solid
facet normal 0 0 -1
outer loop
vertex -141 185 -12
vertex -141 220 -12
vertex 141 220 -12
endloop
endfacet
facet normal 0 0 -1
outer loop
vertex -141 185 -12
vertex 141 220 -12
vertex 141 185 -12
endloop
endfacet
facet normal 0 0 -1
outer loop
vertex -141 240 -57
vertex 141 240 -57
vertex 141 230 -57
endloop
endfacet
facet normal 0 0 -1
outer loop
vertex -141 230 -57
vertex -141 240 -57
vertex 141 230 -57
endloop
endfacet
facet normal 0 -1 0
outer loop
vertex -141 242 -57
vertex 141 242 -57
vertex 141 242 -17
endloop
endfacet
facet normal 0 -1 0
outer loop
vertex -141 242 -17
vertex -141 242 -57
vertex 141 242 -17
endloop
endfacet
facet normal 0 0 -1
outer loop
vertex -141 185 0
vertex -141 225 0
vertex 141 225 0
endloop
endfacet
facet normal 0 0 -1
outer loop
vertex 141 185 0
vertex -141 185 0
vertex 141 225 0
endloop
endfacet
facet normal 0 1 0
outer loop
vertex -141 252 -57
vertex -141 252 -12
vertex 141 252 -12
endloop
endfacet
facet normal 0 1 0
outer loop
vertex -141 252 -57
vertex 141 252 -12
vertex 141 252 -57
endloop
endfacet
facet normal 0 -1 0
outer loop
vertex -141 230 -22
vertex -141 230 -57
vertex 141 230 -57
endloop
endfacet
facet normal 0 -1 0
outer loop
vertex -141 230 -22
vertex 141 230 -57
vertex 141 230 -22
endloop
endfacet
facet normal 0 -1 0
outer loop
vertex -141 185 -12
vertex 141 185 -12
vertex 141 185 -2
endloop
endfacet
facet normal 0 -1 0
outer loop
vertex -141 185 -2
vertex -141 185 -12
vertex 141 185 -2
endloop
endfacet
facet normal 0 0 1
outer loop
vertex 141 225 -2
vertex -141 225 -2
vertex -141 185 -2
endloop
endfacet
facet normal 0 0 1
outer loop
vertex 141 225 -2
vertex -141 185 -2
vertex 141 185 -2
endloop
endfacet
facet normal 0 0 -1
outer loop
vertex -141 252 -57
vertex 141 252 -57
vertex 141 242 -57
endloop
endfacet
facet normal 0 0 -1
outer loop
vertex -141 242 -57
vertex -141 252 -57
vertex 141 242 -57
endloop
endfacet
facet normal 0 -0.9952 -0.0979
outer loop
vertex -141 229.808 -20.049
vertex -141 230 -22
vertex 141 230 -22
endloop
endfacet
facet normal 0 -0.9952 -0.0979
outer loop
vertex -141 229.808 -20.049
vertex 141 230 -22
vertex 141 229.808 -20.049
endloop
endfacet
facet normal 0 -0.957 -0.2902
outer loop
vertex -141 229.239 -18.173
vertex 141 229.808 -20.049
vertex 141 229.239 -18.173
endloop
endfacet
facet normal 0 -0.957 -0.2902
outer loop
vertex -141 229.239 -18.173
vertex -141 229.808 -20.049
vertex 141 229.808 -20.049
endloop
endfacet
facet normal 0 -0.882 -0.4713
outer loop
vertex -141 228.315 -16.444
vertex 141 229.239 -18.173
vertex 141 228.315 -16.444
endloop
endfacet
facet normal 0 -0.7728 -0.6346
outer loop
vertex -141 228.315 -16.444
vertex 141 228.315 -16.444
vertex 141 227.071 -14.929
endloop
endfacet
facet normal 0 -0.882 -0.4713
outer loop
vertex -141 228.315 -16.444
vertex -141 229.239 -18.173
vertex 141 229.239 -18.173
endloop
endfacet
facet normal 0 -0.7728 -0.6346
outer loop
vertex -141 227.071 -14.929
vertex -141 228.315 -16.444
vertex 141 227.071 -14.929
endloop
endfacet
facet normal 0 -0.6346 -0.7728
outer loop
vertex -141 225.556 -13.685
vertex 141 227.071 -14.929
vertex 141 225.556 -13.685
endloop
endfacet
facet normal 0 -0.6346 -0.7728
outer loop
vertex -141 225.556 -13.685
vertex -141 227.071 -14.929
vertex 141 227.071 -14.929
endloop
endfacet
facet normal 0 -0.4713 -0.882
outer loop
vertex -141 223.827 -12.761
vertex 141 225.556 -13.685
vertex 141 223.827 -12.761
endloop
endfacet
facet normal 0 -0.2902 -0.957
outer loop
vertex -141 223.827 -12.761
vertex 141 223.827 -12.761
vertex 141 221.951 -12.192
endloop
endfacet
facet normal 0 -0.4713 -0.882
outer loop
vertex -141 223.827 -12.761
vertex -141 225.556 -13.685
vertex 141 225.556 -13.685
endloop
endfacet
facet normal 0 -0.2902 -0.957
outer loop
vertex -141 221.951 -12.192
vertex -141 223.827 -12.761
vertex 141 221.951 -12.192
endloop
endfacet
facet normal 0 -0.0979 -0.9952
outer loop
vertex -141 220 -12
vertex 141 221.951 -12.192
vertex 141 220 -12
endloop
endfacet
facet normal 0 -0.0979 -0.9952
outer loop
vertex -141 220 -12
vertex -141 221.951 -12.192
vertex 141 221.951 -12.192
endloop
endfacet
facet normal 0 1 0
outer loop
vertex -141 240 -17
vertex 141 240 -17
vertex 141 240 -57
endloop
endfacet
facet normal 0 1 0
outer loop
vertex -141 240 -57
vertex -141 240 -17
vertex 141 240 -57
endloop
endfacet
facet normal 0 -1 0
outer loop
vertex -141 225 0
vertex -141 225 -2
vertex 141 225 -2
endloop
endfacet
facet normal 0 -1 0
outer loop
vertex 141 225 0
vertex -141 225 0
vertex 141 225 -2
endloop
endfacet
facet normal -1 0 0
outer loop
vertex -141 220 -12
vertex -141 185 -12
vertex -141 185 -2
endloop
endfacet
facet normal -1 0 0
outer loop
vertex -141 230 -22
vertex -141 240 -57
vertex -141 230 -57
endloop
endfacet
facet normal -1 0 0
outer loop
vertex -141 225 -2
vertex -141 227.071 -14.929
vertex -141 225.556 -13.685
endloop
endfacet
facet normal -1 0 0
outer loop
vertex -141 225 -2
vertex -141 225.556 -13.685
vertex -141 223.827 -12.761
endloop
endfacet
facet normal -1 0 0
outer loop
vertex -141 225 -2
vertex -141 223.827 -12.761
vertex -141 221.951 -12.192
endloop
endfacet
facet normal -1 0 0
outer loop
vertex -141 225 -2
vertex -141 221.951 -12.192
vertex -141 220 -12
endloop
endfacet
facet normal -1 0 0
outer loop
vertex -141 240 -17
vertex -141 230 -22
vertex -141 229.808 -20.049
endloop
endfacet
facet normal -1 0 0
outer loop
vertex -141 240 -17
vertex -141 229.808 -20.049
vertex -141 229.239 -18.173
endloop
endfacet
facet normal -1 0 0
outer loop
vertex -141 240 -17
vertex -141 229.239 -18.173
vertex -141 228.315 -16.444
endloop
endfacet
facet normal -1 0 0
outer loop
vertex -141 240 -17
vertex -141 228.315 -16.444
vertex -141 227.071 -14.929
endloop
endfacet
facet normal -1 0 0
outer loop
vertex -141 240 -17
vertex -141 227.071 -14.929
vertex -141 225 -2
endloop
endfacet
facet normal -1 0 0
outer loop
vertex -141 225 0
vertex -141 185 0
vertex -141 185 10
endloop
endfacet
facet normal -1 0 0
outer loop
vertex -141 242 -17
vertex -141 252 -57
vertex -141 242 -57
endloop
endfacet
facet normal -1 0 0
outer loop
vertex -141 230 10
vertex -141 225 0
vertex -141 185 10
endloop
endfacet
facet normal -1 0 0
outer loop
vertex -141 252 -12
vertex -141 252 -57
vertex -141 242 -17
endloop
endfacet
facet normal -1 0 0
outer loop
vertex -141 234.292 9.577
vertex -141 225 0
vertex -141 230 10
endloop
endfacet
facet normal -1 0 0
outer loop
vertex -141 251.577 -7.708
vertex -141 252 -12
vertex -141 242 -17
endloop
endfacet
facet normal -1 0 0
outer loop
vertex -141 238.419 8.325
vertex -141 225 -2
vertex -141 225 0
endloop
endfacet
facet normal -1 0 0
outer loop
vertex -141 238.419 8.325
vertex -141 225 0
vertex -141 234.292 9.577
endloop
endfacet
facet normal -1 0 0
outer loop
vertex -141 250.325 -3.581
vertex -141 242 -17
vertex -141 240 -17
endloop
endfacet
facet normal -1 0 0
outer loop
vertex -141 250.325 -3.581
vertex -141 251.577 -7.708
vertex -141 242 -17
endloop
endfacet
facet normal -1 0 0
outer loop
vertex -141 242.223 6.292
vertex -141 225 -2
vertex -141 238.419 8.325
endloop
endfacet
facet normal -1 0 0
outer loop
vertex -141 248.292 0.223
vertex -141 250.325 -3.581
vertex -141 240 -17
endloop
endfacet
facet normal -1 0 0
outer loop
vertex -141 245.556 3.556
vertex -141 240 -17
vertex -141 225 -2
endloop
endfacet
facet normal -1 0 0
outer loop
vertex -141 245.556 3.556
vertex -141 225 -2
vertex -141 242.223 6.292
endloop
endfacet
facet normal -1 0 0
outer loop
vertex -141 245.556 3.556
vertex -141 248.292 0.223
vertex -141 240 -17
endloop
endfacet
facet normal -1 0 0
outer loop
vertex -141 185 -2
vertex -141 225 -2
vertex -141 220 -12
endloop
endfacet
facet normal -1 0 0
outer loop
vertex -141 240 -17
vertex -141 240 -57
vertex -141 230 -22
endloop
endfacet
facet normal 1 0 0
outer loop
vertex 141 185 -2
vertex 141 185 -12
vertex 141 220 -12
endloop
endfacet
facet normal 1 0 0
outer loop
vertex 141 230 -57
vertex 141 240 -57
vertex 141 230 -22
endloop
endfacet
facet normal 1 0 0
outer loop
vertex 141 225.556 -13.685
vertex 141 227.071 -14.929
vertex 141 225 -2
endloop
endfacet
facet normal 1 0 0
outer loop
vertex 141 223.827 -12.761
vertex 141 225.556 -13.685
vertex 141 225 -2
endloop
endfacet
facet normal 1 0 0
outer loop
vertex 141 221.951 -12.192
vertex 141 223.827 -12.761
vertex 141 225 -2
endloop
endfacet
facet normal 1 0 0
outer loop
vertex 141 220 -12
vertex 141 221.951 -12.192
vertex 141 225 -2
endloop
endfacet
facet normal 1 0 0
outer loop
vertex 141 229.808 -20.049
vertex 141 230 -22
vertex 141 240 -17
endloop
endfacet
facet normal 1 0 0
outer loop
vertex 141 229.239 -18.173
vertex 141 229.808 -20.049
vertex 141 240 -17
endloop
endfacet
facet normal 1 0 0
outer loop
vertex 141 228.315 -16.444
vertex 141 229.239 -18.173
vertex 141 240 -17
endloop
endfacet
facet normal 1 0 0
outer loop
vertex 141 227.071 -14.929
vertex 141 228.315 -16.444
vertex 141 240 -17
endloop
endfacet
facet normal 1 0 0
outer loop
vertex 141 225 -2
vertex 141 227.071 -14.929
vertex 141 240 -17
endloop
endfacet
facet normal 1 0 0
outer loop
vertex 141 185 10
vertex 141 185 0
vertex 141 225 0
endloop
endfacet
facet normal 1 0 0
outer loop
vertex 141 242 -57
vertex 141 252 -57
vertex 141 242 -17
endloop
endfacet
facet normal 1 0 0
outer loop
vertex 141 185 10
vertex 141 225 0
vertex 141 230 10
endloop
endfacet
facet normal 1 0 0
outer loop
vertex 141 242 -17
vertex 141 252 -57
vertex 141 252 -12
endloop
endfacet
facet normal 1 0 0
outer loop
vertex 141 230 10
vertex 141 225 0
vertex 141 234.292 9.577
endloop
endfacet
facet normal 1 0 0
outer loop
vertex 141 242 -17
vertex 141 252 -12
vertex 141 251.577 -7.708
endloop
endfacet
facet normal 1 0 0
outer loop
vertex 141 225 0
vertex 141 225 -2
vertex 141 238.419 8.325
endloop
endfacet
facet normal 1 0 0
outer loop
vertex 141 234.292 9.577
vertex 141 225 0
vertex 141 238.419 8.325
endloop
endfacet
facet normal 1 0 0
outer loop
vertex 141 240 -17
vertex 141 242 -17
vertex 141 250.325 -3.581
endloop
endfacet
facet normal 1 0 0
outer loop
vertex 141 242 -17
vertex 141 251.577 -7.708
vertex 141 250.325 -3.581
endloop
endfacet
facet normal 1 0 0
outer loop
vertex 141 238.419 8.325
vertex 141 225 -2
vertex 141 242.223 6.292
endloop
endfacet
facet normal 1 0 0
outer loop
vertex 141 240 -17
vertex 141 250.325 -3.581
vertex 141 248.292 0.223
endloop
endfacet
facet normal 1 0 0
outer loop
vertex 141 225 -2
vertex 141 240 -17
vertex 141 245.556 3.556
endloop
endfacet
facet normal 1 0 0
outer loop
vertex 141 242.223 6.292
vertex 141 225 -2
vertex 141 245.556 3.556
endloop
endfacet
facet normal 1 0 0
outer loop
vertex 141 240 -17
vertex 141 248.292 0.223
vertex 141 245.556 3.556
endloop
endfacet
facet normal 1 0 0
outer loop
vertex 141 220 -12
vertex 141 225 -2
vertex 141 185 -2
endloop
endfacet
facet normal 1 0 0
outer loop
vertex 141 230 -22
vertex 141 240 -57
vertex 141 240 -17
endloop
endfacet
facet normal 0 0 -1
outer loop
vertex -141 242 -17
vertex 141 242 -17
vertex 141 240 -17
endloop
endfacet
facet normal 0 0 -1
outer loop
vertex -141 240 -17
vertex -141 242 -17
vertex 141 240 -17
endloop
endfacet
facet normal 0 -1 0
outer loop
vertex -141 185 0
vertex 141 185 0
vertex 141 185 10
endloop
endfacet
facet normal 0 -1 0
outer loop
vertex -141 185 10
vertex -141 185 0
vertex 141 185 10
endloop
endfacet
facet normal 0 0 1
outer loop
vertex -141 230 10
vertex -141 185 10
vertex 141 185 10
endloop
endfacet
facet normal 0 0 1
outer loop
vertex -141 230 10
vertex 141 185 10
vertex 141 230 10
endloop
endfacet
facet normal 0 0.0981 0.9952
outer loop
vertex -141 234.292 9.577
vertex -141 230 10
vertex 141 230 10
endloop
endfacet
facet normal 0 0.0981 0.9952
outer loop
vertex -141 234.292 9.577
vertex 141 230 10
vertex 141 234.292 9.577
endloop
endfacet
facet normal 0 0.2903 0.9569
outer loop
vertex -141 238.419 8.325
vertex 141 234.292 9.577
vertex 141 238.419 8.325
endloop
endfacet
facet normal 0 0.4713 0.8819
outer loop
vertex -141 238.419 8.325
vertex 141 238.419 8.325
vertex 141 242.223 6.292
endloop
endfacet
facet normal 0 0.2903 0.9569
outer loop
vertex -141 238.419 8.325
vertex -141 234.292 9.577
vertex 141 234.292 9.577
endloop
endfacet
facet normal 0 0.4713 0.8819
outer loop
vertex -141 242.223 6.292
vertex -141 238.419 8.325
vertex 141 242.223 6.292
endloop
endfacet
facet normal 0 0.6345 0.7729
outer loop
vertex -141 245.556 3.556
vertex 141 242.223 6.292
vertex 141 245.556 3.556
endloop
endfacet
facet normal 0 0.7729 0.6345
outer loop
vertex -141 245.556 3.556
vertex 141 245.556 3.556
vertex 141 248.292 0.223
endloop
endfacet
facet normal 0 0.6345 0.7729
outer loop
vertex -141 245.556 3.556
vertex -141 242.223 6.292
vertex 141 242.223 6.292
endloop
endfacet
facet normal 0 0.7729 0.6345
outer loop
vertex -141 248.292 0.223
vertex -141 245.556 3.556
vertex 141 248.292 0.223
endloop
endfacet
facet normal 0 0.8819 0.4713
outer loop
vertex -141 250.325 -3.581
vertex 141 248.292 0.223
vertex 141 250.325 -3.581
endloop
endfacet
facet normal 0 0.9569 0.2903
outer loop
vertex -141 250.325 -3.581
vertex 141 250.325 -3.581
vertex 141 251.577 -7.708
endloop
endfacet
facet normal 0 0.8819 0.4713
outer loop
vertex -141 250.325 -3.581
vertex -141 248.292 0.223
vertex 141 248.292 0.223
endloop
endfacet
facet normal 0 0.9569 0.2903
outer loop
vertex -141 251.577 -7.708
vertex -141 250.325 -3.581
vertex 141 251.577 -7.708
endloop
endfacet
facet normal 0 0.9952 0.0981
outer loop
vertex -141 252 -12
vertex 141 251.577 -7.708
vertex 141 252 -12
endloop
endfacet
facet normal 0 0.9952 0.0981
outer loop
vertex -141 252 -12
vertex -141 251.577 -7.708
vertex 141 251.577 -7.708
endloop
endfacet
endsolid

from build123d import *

# Parameters (mm, degrees)
BOSS_EXTRUDE1_DEPTH      = 141
BOSS_EXTRUDE1_DEPTH_BACK = 141
CAVITY1_START            = -2
CAVITY1_OUTLINE_W        = 282
CAVITY1_OUTLINE_H        = 40
CAVITY1_DEPTH            = 2


# Read off the part's stored shape, not the designer's step: Cavity1
with BuildPart() as part:
    # Sketch2 → Boss-Extrude1 (new, two sides: drawn at the far end of the back side and taken through both)
    with BuildSketch(Plane(origin=(0, 0, 0), x_dir=(0, 0, -1), z_dir=(1, 0, 0)).offset(-BOSS_EXTRUDE1_DEPTH_BACK)):
        with BuildLine():
            Line((12, 220), (12, 185))
            Line((12, 185), (-10, 185))
            Line((-10, 185), (-10, 230))
            ThreePointArc((-10, 230), (-3.556349186, 245.556349186), (12, 252))
            Line((12, 252), (57, 252))
            Line((57, 252), (57, 242))
            Line((57, 242), (17, 242))
            Line((17, 242), (17, 240))
            Line((17, 240), (57, 240))
            Line((57, 240), (57, 230))
            Line((57, 230), (22, 230))
            ThreePointArc((22, 230), (14.928932188, 227.071067812), (12, 220))
        make_face()
    extrude(amount=BOSS_EXTRUDE1_DEPTH + BOSS_EXTRUDE1_DEPTH_BACK)

    # Cavity1 outline → Cavity1 (cut)
    with BuildSketch(Plane.XY.offset(CAVITY1_START)):
        with Locations((0, 205)):
            Rectangle(CAVITY1_OUTLINE_W, CAVITY1_OUTLINE_H)
    extrude(amount=CAVITY1_DEPTH, mode=Mode.SUBTRACT)


solid = part.part
